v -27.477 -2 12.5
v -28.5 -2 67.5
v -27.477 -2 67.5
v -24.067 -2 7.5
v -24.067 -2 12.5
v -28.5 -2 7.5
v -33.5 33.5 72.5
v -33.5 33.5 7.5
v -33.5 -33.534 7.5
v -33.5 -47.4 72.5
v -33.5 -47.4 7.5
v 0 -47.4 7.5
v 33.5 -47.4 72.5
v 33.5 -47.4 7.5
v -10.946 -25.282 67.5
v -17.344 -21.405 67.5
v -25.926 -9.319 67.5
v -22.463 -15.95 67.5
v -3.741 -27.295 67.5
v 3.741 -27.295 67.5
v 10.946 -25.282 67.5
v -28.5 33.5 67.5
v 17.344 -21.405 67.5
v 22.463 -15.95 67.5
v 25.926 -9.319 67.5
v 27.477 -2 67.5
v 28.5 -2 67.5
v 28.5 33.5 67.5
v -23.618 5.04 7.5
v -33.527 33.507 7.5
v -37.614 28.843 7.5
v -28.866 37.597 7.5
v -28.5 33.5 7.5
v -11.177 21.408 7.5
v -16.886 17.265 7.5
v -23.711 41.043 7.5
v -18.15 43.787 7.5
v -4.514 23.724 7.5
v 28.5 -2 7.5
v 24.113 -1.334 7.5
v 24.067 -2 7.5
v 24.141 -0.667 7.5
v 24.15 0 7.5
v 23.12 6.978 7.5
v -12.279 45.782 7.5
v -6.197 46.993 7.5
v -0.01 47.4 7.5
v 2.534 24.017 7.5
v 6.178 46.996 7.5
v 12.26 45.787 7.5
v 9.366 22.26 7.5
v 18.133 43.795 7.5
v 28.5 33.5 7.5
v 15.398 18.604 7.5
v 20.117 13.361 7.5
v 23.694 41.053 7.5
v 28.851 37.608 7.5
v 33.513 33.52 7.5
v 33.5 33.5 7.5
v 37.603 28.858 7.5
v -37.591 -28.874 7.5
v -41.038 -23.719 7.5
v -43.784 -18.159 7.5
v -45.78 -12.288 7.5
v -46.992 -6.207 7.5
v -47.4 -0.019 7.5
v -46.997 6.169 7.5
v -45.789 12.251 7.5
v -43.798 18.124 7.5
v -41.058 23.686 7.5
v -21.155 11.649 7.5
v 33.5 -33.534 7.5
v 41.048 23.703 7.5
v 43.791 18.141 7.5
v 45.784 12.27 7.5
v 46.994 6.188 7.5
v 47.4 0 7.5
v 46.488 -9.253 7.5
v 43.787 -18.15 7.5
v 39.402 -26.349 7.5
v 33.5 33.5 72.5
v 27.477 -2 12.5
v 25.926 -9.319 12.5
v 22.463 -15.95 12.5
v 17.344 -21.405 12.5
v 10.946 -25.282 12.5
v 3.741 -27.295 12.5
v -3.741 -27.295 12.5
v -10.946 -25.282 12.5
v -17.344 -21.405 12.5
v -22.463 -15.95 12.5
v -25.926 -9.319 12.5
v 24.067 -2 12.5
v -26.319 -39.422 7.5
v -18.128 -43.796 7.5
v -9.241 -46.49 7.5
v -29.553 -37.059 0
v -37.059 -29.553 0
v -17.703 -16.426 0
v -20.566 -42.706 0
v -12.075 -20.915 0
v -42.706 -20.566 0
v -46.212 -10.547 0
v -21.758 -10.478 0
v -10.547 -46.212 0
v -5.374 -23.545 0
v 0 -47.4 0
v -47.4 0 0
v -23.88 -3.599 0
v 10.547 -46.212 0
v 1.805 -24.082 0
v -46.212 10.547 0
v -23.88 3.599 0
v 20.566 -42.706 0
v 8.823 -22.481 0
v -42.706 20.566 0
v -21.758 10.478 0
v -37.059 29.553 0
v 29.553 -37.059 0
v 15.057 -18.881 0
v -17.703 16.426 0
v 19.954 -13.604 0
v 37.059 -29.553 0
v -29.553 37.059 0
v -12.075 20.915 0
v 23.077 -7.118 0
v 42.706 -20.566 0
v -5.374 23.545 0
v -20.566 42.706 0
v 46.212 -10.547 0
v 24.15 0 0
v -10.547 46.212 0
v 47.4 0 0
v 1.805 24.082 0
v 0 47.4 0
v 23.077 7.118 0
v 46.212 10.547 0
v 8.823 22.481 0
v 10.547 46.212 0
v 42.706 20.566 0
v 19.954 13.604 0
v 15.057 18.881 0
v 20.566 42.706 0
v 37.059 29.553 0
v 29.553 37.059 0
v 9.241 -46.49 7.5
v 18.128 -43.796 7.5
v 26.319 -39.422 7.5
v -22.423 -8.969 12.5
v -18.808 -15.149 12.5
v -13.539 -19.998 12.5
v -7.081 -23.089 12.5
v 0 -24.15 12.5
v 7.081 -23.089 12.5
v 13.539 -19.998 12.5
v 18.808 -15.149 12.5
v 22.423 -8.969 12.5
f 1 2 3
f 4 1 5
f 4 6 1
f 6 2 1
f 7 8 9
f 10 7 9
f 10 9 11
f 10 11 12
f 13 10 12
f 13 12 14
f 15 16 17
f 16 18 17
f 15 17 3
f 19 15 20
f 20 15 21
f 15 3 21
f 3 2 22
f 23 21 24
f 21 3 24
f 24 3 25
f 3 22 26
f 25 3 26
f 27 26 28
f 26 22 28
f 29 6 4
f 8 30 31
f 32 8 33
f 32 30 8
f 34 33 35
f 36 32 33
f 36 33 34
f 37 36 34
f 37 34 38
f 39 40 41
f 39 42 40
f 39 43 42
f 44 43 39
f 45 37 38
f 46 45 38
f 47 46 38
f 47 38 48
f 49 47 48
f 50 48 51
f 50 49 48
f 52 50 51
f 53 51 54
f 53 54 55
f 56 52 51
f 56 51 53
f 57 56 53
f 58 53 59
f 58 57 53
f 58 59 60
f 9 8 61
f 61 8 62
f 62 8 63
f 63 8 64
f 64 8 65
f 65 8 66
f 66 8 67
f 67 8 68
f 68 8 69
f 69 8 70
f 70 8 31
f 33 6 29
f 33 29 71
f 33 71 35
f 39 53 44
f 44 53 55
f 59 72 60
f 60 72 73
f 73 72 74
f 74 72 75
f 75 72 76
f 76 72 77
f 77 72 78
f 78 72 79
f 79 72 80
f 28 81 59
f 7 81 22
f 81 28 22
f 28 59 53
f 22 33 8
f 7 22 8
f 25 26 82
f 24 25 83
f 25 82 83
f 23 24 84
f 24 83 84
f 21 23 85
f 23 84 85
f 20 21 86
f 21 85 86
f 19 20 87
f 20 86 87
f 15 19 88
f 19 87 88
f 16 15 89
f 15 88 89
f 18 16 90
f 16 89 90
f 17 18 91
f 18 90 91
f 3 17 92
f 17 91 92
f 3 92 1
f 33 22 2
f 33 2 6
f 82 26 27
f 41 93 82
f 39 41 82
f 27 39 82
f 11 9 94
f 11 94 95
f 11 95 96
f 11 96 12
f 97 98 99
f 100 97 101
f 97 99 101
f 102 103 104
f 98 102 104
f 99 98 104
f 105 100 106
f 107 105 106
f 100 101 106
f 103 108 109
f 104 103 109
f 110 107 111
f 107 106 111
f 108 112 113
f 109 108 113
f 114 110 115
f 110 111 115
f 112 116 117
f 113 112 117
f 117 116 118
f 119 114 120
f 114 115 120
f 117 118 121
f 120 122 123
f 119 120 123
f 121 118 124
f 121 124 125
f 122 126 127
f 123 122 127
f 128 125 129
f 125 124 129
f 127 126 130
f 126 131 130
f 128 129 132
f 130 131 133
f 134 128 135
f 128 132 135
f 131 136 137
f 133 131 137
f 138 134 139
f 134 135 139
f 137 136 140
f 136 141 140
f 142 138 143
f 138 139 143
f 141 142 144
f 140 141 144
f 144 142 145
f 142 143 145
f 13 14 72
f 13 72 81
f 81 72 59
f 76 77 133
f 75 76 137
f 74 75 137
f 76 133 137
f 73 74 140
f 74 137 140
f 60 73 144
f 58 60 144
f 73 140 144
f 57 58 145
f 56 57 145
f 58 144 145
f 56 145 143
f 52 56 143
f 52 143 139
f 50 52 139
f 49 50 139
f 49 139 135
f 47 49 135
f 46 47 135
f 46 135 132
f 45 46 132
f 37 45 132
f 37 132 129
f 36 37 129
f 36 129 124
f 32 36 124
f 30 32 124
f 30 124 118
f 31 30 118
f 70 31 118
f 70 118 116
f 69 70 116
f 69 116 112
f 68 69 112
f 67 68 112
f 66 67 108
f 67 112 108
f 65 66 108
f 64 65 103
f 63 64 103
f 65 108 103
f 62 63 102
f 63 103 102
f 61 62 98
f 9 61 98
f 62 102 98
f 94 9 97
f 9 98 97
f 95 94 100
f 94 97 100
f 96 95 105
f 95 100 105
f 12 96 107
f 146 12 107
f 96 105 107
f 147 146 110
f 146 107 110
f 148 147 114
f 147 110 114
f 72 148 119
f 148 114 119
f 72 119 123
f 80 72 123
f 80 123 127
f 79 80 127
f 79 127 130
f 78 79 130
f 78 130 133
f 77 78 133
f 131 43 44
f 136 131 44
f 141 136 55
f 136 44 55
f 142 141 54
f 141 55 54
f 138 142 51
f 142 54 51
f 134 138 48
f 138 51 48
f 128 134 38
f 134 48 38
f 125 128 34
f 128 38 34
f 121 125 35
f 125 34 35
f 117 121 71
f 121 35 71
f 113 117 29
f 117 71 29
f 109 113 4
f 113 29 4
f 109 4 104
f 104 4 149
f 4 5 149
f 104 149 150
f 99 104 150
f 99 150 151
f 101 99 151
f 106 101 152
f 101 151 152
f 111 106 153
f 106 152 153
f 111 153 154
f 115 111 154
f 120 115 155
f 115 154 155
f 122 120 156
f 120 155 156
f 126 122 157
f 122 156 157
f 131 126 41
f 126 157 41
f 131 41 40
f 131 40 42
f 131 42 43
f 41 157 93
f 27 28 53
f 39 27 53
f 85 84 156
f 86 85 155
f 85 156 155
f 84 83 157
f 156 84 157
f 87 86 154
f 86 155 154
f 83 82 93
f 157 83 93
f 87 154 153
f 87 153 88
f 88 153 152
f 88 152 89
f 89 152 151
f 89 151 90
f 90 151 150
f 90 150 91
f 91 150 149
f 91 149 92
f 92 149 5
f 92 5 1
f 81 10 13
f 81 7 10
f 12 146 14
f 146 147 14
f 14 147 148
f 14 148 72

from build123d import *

# Parameters (mm, degrees)
SKETCH3_R           = 47.4
BOSS_EXTRUDE2_DEPTH = 7.5
SKETCH4_R           = 24.15
CUT_EXTRUDE1_DEPTH  = 15
BOSS_EXTRUDE4_DEPTH = 65
SKETCH6_R           = 24.15
CUT_EXTRUDE2_DEPTH  = 5
SKETCH7_W           = 57
SKETCH7_H           = 60
CUT_EXTRUDE3_DEPTH  = 35.5
SKETCH8_R           = 27.55
CUT_EXTRUDE4_DEPTH  = 55


with BuildPart() as part:
    # Sketch3 → Boss-Extrude2 (new body)
    with BuildSketch(Plane.XY):
        Circle(SKETCH3_R)
    extrude(amount=BOSS_EXTRUDE2_DEPTH)

    # Sketch4 → Cut-Extrude1 (cut)
    with BuildSketch(Plane.XY.offset(7.5)):
        Circle(SKETCH4_R)
    extrude(amount=-CUT_EXTRUDE1_DEPTH, mode=Mode.SUBTRACT)

    # Sketch5 → Boss-Extrude4 (add)
    with BuildSketch(Plane.XY.offset(7.5)):
        Polygon((-33.5, -47.4), (33.5, -47.4), (33.5, -33.5), (33.5, 33.5), (0, 33.5), (-33.5, 33.5), (-33.5, -33.5), align=None)
    extrude(amount=BOSS_EXTRUDE4_DEPTH)

    # Sketch6 → Cut-Extrude2 (cut)
    with BuildSketch(Plane(origin=(0, 0, 7.5), x_dir=(-1, 0, 0), z_dir=(0, 0, -1))):
        Circle(SKETCH6_R)
    extrude(amount=-CUT_EXTRUDE2_DEPTH, mode=Mode.SUBTRACT)

    # Sketch7 → Cut-Extrude3 (cut)
    with BuildSketch(Plane(origin=(0, 33.5, 0), x_dir=(1, 0, 0), z_dir=(0, 1, 0))):
        with Locations((0, -37.5)):
            Rectangle(SKETCH7_W, SKETCH7_H)
    extrude(amount=-CUT_EXTRUDE3_DEPTH, mode=Mode.SUBTRACT)

    # Sketch8 → Cut-Extrude4 (cut)
    with BuildSketch(Plane(origin=(0, 0, 12.5), x_dir=(-1, 0, 0), z_dir=(0, 0, -1))):
        Circle(SKETCH8_R)
    extrude(amount=-CUT_EXTRUDE4_DEPTH, mode=Mode.SUBTRACT)


solid = part.part
